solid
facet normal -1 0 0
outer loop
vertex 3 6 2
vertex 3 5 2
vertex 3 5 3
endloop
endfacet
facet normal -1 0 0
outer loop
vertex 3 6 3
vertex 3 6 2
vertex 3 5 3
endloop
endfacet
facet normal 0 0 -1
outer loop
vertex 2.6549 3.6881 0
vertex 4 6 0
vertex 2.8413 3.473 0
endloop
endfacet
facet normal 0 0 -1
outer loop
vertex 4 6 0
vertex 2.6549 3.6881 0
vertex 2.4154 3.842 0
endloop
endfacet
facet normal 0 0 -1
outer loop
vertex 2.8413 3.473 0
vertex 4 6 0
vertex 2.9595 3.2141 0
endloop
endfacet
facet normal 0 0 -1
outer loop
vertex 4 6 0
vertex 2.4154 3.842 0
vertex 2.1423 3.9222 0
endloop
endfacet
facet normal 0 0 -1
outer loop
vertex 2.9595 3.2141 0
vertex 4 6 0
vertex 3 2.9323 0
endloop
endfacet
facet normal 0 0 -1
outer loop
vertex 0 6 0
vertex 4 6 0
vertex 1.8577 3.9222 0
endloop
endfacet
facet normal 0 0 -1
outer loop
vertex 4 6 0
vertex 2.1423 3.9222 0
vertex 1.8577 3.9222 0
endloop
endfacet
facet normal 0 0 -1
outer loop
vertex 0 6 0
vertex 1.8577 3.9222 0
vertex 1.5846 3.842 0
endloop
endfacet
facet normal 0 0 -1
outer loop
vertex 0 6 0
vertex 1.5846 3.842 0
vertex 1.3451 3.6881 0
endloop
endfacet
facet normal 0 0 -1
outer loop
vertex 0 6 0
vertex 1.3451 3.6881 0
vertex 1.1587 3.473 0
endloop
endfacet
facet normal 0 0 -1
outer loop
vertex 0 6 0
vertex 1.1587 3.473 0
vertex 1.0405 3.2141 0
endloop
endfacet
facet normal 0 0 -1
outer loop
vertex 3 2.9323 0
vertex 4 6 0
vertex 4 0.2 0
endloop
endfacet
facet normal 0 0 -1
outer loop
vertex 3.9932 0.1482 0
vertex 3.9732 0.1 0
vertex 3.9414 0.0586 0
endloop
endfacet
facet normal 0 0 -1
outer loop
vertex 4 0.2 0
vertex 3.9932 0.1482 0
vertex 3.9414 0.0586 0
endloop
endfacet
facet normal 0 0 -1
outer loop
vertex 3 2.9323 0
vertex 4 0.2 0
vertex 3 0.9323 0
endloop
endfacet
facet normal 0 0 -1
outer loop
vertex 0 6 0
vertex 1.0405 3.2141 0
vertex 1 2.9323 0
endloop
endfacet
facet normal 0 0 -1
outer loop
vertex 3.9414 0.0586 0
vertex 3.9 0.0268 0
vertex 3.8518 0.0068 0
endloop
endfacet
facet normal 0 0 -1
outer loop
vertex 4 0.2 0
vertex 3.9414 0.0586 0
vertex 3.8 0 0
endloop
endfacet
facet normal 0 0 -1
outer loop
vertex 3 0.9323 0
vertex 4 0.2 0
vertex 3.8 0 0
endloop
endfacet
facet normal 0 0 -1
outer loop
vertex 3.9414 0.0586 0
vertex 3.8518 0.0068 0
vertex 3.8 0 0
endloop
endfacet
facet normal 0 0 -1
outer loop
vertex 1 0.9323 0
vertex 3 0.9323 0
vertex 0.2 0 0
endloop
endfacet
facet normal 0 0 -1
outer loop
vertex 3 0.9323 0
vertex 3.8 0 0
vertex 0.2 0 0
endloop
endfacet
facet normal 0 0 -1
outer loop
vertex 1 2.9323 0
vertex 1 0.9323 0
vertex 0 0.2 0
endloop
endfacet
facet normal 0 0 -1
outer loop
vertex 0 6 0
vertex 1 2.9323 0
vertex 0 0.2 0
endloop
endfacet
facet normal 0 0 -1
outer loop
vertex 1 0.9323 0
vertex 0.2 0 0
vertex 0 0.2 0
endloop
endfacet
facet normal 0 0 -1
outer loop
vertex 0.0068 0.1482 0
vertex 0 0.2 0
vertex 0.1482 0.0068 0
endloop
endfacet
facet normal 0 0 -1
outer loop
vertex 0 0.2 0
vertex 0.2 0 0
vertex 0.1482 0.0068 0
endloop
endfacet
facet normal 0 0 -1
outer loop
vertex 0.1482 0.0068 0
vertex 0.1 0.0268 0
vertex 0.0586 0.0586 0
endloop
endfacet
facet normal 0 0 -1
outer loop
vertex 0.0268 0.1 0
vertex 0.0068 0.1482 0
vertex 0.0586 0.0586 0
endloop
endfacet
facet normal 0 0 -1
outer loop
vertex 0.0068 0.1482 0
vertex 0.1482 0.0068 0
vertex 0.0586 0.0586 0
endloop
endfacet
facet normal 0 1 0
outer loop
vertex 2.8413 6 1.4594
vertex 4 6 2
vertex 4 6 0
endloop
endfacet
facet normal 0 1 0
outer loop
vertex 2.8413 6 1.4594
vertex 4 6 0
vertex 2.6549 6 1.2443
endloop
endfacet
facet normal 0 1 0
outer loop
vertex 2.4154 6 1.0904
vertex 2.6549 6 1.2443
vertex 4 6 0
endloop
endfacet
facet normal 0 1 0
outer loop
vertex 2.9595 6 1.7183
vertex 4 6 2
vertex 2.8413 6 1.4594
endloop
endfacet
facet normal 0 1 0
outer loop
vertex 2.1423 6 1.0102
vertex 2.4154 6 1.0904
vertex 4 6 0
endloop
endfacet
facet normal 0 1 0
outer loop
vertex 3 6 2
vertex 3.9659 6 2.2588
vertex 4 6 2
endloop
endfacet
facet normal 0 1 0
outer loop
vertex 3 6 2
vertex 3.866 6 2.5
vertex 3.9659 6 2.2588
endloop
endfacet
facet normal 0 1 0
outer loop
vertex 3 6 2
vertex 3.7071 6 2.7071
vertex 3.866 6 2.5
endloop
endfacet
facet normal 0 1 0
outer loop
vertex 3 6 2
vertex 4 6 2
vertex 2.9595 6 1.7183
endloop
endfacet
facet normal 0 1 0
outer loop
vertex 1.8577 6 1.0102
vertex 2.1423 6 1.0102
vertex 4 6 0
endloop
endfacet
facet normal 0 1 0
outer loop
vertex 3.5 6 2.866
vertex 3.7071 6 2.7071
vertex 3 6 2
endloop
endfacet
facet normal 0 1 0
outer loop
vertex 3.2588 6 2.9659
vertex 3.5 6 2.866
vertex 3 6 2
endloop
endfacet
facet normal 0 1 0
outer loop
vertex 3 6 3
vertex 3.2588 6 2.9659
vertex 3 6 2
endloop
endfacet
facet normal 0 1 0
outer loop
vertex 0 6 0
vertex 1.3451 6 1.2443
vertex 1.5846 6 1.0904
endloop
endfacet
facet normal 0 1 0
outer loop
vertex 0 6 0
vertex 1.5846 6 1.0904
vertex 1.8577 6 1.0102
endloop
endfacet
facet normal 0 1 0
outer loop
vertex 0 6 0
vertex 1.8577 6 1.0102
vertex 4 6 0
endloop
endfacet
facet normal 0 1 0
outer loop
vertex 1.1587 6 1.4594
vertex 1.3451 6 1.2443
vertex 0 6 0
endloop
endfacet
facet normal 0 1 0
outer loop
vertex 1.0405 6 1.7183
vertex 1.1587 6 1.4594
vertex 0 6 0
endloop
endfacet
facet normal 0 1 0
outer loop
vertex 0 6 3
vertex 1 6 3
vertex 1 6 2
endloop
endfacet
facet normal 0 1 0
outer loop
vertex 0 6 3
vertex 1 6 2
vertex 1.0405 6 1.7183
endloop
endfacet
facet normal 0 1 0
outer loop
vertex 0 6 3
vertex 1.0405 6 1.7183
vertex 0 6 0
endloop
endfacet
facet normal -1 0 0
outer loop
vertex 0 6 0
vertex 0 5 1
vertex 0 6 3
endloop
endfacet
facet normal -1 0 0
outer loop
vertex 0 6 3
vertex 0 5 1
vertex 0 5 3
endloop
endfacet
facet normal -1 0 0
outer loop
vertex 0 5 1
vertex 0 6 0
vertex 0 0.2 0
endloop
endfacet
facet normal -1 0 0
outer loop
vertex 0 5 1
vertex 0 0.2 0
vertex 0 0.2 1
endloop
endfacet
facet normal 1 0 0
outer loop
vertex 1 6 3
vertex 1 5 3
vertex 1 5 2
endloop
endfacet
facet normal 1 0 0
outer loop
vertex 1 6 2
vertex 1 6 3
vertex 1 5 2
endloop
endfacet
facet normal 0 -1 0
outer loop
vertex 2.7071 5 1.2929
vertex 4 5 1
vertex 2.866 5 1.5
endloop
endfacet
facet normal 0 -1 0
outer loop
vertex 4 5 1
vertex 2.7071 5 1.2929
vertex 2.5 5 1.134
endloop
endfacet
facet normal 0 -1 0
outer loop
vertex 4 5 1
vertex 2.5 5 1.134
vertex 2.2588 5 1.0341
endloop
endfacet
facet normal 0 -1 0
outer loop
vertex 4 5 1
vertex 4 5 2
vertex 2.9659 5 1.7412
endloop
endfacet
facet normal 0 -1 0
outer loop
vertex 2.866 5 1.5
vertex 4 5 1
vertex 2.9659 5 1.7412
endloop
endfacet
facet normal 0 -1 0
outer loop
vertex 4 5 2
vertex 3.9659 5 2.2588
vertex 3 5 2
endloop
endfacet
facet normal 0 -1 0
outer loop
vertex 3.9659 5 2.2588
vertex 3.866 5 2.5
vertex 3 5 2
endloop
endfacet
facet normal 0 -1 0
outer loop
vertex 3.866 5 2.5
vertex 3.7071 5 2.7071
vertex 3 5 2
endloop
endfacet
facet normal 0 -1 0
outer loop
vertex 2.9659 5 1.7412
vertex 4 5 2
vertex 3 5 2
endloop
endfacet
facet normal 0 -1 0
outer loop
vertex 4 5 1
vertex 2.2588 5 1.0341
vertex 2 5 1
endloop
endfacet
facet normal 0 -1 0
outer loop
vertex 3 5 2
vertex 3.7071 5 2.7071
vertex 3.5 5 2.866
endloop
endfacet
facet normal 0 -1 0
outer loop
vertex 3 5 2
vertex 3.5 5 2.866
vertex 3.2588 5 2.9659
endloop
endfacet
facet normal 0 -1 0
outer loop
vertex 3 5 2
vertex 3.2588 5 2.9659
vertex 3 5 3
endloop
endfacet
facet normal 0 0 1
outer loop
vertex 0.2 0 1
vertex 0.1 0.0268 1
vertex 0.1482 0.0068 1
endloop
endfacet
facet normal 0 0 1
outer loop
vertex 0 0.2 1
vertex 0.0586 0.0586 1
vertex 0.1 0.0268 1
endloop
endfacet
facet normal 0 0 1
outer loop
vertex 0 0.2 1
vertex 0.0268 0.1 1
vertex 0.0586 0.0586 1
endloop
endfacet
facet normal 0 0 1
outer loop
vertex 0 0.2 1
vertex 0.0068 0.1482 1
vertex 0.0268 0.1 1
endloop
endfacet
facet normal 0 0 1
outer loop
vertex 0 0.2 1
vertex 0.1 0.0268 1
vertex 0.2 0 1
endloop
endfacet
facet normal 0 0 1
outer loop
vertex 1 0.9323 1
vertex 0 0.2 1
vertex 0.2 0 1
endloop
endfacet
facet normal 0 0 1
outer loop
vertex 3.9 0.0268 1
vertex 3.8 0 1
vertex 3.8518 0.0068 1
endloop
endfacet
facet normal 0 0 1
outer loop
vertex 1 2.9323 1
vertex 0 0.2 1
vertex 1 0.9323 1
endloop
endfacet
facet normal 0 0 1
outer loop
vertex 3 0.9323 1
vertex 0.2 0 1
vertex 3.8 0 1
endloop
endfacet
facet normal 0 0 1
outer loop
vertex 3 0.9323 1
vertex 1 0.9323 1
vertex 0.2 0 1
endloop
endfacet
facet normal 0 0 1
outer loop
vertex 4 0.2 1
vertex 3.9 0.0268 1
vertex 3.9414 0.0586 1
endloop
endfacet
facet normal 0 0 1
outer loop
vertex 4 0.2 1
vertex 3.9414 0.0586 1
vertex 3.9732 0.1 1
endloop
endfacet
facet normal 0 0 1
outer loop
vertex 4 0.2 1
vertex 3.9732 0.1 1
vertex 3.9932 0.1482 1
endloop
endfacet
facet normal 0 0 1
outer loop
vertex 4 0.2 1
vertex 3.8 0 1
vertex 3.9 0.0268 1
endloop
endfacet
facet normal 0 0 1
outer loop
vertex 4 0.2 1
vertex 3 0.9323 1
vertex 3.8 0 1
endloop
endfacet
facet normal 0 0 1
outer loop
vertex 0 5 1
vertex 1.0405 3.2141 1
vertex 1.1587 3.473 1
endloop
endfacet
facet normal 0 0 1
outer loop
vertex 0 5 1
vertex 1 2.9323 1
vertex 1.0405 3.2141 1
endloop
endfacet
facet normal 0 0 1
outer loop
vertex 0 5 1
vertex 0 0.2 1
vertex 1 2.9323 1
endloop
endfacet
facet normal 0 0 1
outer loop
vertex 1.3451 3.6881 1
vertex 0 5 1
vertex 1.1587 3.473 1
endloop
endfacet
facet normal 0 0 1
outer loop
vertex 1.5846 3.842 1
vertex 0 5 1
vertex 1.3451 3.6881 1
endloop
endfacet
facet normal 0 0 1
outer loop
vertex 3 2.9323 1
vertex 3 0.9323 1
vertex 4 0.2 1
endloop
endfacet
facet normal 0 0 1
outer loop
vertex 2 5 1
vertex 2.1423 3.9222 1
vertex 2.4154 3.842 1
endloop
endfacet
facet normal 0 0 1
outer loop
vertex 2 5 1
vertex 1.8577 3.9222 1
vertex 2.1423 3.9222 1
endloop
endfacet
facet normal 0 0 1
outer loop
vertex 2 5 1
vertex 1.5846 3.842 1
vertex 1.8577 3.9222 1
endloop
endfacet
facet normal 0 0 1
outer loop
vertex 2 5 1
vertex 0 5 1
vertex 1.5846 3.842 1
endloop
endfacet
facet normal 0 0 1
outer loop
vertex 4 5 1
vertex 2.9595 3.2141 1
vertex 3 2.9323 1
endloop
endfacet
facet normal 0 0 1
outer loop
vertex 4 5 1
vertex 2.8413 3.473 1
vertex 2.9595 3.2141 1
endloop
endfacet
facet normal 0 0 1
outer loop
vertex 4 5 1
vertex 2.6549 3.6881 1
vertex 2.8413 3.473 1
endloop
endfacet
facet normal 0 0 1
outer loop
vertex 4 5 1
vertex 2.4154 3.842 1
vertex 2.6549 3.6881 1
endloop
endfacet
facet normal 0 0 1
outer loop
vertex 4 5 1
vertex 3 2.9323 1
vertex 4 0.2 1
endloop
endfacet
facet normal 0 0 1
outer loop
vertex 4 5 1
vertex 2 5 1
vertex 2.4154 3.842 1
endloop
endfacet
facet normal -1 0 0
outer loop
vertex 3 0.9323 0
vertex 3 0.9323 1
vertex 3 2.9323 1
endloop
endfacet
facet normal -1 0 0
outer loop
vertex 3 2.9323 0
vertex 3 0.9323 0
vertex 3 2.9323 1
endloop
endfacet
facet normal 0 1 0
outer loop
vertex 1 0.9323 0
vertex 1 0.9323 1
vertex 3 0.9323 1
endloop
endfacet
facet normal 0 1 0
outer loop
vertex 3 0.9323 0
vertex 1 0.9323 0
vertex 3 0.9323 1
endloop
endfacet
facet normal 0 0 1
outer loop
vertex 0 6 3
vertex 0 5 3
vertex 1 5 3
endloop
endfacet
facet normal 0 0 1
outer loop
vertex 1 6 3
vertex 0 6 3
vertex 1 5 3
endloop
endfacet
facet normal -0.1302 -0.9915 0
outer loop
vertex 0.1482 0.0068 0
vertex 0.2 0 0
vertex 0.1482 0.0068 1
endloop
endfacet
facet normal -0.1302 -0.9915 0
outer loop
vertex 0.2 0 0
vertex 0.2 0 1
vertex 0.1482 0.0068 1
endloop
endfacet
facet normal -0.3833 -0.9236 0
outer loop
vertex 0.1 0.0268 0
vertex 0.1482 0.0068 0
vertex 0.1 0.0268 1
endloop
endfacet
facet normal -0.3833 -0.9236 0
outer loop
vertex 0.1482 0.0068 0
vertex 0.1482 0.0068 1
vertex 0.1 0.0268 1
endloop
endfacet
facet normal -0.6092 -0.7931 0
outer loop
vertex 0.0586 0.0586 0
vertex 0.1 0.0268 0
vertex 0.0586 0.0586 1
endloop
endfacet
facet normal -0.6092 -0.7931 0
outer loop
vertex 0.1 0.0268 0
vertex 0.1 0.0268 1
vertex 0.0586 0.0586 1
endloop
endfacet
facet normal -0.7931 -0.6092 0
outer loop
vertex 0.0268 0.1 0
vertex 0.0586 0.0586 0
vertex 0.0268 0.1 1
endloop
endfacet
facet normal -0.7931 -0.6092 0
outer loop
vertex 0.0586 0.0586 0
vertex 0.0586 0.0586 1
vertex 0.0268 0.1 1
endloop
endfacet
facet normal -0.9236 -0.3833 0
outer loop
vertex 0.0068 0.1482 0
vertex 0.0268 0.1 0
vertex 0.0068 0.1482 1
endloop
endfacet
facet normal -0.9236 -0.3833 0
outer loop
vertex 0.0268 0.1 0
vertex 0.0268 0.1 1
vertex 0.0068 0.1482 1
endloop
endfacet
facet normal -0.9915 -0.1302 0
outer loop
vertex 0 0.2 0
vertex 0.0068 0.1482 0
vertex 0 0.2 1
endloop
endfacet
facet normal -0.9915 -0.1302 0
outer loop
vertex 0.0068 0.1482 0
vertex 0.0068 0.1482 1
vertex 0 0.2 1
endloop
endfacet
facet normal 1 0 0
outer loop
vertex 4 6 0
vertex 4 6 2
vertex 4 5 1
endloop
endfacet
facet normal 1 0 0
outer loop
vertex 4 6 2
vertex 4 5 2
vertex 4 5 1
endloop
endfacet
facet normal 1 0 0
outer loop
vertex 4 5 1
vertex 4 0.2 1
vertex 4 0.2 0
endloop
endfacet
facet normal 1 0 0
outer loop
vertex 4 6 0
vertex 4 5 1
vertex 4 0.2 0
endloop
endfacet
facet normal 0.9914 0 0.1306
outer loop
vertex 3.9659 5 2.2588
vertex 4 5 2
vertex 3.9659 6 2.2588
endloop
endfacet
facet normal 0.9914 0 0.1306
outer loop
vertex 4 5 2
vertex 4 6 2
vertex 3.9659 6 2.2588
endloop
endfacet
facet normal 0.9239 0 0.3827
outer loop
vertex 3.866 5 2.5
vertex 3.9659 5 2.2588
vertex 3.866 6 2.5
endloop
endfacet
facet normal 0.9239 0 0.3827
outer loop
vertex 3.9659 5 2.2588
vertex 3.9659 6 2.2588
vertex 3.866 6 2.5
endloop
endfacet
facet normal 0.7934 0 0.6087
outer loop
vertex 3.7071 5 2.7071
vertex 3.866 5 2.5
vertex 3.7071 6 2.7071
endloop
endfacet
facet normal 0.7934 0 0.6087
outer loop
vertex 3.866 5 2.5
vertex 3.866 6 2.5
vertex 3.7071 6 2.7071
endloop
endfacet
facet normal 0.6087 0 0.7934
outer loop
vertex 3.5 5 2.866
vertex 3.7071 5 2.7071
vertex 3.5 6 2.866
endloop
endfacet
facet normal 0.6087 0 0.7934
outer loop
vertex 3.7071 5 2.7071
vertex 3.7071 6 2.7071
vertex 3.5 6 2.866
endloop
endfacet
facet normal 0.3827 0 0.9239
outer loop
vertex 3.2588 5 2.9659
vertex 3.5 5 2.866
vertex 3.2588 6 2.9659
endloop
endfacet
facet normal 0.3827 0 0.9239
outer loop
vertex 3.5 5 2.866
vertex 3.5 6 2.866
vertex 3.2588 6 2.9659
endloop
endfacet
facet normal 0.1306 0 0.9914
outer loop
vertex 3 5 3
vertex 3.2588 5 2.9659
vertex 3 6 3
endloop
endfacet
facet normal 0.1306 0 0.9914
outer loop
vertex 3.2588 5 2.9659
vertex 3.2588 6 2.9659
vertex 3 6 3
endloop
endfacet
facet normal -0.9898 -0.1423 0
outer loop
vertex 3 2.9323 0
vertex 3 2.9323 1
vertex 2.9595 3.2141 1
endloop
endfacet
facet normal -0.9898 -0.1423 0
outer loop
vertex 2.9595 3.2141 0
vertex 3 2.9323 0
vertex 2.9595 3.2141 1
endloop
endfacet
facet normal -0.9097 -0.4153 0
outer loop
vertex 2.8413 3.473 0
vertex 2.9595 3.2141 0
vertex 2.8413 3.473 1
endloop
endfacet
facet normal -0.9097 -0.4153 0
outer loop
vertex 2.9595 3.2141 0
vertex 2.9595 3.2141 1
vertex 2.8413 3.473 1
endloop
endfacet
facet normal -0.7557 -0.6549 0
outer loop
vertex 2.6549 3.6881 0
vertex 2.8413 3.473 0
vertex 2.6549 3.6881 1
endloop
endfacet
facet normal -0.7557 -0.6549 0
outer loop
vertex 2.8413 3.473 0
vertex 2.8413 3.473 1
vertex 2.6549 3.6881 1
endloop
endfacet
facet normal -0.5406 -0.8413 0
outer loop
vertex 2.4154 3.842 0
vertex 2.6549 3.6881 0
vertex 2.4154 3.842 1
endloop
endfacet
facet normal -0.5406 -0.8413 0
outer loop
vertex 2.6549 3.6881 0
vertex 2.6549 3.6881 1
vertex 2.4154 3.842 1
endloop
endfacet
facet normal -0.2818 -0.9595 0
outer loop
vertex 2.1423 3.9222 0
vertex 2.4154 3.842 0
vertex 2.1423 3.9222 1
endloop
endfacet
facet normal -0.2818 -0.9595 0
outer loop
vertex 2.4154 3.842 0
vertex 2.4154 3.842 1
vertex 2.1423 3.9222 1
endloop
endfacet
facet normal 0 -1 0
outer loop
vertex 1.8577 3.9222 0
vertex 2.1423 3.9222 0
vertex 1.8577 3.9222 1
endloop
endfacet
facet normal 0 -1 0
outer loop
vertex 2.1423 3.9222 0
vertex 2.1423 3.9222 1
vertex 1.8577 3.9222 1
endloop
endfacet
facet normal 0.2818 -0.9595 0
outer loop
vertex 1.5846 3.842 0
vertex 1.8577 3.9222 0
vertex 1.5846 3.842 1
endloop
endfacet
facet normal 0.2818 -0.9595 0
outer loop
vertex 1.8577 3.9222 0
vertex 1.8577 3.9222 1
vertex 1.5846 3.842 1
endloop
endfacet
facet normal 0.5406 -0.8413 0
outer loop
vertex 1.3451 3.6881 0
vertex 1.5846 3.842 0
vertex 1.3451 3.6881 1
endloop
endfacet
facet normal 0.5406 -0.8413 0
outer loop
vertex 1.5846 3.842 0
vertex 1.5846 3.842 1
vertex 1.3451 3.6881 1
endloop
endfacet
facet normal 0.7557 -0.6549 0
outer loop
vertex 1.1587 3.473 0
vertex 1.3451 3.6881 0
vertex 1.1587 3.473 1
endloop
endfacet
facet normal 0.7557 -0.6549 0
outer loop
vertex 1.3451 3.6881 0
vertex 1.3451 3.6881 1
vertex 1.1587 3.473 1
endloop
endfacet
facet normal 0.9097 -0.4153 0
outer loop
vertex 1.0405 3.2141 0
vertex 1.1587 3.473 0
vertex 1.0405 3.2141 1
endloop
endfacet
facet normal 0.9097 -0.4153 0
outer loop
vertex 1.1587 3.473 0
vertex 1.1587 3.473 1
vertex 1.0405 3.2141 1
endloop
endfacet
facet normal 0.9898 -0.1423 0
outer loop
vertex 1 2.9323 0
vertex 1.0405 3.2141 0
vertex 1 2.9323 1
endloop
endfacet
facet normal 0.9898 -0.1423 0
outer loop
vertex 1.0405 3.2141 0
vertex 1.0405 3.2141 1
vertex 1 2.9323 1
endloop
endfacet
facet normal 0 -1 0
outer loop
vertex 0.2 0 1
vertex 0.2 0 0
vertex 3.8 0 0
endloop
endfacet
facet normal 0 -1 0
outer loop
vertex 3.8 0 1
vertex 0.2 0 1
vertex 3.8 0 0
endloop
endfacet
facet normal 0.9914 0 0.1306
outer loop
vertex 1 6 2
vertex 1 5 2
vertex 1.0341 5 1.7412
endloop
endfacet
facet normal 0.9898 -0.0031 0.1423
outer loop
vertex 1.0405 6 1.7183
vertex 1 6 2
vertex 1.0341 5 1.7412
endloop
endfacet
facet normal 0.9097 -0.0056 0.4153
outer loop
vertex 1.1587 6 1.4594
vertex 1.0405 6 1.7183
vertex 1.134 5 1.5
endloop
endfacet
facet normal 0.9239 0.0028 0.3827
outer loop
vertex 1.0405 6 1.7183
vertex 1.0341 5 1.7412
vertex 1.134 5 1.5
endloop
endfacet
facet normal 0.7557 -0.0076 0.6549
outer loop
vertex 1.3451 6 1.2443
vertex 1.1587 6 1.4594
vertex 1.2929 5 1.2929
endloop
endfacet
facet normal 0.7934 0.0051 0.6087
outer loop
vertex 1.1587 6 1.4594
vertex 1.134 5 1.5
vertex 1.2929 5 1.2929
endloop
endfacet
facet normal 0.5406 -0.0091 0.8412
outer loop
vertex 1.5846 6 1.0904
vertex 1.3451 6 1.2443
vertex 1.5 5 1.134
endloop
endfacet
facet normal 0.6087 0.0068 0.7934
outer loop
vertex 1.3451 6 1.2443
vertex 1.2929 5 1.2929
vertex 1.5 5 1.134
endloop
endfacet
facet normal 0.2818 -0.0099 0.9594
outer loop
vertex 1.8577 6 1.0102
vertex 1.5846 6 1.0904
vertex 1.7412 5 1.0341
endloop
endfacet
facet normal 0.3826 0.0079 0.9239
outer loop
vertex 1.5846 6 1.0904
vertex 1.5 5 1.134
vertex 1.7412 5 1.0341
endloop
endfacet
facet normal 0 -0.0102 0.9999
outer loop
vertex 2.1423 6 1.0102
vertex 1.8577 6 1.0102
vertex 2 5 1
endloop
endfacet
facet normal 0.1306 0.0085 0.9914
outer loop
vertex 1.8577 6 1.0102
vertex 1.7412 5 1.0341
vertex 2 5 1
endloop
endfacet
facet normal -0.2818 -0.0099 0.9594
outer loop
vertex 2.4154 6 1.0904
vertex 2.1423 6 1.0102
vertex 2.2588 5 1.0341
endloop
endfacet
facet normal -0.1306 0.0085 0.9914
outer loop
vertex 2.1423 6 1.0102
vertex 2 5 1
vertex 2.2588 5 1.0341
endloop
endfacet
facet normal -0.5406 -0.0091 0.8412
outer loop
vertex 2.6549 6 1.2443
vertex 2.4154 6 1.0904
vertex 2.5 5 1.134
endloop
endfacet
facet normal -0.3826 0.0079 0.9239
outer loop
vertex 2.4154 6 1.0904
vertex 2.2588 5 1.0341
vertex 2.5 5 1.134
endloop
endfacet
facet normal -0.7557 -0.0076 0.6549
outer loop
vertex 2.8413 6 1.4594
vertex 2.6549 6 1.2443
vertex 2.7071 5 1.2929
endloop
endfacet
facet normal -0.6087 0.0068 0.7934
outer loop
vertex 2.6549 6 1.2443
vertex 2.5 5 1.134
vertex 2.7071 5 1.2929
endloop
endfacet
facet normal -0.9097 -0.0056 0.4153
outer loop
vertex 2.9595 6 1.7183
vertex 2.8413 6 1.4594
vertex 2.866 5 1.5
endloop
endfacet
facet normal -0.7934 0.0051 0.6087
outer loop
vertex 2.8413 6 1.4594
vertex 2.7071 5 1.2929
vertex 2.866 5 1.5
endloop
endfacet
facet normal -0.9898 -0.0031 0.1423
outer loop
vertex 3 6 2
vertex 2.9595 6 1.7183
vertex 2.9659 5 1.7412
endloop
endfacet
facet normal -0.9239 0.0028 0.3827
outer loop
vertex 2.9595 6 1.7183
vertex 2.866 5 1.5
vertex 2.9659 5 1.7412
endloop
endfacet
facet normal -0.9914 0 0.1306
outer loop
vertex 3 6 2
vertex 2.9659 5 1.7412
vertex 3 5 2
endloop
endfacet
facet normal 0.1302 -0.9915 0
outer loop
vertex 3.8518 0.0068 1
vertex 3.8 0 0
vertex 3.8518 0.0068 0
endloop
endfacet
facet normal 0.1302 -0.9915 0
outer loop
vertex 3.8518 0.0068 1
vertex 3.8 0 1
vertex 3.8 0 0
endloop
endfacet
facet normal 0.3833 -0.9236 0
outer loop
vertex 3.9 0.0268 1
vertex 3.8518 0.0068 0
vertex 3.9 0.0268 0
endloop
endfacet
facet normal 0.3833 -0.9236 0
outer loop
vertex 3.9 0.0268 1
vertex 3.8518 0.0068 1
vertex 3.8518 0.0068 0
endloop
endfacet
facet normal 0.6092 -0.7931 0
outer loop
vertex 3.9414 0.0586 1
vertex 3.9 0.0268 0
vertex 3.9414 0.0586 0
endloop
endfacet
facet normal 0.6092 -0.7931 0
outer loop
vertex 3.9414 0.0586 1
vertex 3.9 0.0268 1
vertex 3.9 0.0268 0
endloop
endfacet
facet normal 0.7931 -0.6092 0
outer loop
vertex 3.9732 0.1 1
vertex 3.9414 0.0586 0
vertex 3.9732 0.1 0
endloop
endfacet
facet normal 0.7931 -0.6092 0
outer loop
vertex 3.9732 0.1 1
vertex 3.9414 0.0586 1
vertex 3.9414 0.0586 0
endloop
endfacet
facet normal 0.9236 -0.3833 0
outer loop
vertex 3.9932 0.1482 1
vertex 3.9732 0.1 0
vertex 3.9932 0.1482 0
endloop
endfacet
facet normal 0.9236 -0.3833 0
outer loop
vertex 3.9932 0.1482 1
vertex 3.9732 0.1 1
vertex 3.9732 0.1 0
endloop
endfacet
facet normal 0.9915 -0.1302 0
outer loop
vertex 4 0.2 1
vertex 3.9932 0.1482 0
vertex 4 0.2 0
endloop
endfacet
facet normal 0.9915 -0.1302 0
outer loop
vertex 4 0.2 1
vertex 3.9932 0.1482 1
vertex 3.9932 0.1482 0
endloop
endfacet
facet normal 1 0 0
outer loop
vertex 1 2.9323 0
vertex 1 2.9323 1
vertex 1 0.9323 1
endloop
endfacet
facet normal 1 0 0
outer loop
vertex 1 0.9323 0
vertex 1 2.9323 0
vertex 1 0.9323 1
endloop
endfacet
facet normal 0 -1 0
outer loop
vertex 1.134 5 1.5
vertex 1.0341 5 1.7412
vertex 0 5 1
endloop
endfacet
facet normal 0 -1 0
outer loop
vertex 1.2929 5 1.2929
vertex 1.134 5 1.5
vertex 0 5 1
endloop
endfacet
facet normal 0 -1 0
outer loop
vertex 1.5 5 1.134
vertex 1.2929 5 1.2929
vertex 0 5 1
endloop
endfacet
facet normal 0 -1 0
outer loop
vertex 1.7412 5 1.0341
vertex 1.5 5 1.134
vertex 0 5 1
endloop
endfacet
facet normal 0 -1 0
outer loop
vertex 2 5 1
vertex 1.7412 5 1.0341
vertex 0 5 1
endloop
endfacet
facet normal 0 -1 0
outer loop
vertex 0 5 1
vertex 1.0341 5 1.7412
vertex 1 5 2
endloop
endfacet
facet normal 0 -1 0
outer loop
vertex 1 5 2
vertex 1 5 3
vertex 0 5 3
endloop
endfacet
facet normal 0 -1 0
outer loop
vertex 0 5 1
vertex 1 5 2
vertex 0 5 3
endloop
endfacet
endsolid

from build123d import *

# Parameters (mm, degrees)
F0_W     = 4
F0_H     = 5
F1_DEPTH = 1
F2_R     = 0.2
F3_R     = 0.2
F5_DEPTH = 25
F7_DEPTH = 1
F8_R     = 0.99999


# Not quite as in the source:
# - a fillet or chamfer is up to 0.001 mm smaller than in the source, because OpenCascade refuses the exact size


with BuildPart() as f1:
    # F0 (on Top) → F1 (new body)
    with BuildSketch(Plane.XY):
        with Locations((2, 2.5)):
            Rectangle(F0_W, F0_H)
    extrude(amount=F1_DEPTH)

    # F2
    f2_edges = [f1.edges().sort_by_distance(p)[0] for p in [
        (4, 0, 0.5),
    ]]
    fillet(f2_edges, radius=F2_R)

    # F3
    f3_edges = [f1.edges().sort_by_distance(p)[0] for p in [
        (0, 0, 0.5),
    ]]
    fillet(f3_edges, radius=F3_R)

    # F4 (on face) → F5 (cut)
    with BuildSketch(Plane.XY.offset(1)):
        with BuildLine():
            Line((1, 2.9323451086), (1, 0.9323451086))
            Line((1, 0.9323451086), (3, 0.9323451086))
            Line((3, 0.9323451086), (3, 2.9323451086))
            ThreePointArc((3, 2.9323451086), (2, 3.9323451086), (1, 2.9323451086))
        make_face()
    extrude(amount=-F5_DEPTH, mode=Mode.SUBTRACT)

    # F6 (on face) → F7 (join)
    with BuildSketch(Plane(origin=(0, 5, 0), x_dir=(-1, 0, 0), z_dir=(0, 1, 0))):
        with BuildLine():
            Line((-4, 3), (-4, 1))
            Line((-4, 1), (-4, 0))
            Line((-4, 0), (0, 0))
            Line((0, 0), (0, 1))
            Line((0, 1), (0, 3))
            Line((0, 3), (-1, 3))
            Line((-1, 3), (-1, 2))
            ThreePointArc((-1, 2), (-2, 1), (-3, 2))
            Line((-3, 2), (-3, 3))
            Line((-3, 3), (-4, 3))
        make_face()
    extrude(amount=F7_DEPTH)

    # F8 (radius 1 in the source; OpenCascade refuses exactly that, so slightly less here)
    f8_edges = [f1.edges().sort_by_distance(p)[0] for p in [
        (4, 5.5, 3),
    ]]
    fillet(f8_edges, radius=F8_R)


solid = f1.part
